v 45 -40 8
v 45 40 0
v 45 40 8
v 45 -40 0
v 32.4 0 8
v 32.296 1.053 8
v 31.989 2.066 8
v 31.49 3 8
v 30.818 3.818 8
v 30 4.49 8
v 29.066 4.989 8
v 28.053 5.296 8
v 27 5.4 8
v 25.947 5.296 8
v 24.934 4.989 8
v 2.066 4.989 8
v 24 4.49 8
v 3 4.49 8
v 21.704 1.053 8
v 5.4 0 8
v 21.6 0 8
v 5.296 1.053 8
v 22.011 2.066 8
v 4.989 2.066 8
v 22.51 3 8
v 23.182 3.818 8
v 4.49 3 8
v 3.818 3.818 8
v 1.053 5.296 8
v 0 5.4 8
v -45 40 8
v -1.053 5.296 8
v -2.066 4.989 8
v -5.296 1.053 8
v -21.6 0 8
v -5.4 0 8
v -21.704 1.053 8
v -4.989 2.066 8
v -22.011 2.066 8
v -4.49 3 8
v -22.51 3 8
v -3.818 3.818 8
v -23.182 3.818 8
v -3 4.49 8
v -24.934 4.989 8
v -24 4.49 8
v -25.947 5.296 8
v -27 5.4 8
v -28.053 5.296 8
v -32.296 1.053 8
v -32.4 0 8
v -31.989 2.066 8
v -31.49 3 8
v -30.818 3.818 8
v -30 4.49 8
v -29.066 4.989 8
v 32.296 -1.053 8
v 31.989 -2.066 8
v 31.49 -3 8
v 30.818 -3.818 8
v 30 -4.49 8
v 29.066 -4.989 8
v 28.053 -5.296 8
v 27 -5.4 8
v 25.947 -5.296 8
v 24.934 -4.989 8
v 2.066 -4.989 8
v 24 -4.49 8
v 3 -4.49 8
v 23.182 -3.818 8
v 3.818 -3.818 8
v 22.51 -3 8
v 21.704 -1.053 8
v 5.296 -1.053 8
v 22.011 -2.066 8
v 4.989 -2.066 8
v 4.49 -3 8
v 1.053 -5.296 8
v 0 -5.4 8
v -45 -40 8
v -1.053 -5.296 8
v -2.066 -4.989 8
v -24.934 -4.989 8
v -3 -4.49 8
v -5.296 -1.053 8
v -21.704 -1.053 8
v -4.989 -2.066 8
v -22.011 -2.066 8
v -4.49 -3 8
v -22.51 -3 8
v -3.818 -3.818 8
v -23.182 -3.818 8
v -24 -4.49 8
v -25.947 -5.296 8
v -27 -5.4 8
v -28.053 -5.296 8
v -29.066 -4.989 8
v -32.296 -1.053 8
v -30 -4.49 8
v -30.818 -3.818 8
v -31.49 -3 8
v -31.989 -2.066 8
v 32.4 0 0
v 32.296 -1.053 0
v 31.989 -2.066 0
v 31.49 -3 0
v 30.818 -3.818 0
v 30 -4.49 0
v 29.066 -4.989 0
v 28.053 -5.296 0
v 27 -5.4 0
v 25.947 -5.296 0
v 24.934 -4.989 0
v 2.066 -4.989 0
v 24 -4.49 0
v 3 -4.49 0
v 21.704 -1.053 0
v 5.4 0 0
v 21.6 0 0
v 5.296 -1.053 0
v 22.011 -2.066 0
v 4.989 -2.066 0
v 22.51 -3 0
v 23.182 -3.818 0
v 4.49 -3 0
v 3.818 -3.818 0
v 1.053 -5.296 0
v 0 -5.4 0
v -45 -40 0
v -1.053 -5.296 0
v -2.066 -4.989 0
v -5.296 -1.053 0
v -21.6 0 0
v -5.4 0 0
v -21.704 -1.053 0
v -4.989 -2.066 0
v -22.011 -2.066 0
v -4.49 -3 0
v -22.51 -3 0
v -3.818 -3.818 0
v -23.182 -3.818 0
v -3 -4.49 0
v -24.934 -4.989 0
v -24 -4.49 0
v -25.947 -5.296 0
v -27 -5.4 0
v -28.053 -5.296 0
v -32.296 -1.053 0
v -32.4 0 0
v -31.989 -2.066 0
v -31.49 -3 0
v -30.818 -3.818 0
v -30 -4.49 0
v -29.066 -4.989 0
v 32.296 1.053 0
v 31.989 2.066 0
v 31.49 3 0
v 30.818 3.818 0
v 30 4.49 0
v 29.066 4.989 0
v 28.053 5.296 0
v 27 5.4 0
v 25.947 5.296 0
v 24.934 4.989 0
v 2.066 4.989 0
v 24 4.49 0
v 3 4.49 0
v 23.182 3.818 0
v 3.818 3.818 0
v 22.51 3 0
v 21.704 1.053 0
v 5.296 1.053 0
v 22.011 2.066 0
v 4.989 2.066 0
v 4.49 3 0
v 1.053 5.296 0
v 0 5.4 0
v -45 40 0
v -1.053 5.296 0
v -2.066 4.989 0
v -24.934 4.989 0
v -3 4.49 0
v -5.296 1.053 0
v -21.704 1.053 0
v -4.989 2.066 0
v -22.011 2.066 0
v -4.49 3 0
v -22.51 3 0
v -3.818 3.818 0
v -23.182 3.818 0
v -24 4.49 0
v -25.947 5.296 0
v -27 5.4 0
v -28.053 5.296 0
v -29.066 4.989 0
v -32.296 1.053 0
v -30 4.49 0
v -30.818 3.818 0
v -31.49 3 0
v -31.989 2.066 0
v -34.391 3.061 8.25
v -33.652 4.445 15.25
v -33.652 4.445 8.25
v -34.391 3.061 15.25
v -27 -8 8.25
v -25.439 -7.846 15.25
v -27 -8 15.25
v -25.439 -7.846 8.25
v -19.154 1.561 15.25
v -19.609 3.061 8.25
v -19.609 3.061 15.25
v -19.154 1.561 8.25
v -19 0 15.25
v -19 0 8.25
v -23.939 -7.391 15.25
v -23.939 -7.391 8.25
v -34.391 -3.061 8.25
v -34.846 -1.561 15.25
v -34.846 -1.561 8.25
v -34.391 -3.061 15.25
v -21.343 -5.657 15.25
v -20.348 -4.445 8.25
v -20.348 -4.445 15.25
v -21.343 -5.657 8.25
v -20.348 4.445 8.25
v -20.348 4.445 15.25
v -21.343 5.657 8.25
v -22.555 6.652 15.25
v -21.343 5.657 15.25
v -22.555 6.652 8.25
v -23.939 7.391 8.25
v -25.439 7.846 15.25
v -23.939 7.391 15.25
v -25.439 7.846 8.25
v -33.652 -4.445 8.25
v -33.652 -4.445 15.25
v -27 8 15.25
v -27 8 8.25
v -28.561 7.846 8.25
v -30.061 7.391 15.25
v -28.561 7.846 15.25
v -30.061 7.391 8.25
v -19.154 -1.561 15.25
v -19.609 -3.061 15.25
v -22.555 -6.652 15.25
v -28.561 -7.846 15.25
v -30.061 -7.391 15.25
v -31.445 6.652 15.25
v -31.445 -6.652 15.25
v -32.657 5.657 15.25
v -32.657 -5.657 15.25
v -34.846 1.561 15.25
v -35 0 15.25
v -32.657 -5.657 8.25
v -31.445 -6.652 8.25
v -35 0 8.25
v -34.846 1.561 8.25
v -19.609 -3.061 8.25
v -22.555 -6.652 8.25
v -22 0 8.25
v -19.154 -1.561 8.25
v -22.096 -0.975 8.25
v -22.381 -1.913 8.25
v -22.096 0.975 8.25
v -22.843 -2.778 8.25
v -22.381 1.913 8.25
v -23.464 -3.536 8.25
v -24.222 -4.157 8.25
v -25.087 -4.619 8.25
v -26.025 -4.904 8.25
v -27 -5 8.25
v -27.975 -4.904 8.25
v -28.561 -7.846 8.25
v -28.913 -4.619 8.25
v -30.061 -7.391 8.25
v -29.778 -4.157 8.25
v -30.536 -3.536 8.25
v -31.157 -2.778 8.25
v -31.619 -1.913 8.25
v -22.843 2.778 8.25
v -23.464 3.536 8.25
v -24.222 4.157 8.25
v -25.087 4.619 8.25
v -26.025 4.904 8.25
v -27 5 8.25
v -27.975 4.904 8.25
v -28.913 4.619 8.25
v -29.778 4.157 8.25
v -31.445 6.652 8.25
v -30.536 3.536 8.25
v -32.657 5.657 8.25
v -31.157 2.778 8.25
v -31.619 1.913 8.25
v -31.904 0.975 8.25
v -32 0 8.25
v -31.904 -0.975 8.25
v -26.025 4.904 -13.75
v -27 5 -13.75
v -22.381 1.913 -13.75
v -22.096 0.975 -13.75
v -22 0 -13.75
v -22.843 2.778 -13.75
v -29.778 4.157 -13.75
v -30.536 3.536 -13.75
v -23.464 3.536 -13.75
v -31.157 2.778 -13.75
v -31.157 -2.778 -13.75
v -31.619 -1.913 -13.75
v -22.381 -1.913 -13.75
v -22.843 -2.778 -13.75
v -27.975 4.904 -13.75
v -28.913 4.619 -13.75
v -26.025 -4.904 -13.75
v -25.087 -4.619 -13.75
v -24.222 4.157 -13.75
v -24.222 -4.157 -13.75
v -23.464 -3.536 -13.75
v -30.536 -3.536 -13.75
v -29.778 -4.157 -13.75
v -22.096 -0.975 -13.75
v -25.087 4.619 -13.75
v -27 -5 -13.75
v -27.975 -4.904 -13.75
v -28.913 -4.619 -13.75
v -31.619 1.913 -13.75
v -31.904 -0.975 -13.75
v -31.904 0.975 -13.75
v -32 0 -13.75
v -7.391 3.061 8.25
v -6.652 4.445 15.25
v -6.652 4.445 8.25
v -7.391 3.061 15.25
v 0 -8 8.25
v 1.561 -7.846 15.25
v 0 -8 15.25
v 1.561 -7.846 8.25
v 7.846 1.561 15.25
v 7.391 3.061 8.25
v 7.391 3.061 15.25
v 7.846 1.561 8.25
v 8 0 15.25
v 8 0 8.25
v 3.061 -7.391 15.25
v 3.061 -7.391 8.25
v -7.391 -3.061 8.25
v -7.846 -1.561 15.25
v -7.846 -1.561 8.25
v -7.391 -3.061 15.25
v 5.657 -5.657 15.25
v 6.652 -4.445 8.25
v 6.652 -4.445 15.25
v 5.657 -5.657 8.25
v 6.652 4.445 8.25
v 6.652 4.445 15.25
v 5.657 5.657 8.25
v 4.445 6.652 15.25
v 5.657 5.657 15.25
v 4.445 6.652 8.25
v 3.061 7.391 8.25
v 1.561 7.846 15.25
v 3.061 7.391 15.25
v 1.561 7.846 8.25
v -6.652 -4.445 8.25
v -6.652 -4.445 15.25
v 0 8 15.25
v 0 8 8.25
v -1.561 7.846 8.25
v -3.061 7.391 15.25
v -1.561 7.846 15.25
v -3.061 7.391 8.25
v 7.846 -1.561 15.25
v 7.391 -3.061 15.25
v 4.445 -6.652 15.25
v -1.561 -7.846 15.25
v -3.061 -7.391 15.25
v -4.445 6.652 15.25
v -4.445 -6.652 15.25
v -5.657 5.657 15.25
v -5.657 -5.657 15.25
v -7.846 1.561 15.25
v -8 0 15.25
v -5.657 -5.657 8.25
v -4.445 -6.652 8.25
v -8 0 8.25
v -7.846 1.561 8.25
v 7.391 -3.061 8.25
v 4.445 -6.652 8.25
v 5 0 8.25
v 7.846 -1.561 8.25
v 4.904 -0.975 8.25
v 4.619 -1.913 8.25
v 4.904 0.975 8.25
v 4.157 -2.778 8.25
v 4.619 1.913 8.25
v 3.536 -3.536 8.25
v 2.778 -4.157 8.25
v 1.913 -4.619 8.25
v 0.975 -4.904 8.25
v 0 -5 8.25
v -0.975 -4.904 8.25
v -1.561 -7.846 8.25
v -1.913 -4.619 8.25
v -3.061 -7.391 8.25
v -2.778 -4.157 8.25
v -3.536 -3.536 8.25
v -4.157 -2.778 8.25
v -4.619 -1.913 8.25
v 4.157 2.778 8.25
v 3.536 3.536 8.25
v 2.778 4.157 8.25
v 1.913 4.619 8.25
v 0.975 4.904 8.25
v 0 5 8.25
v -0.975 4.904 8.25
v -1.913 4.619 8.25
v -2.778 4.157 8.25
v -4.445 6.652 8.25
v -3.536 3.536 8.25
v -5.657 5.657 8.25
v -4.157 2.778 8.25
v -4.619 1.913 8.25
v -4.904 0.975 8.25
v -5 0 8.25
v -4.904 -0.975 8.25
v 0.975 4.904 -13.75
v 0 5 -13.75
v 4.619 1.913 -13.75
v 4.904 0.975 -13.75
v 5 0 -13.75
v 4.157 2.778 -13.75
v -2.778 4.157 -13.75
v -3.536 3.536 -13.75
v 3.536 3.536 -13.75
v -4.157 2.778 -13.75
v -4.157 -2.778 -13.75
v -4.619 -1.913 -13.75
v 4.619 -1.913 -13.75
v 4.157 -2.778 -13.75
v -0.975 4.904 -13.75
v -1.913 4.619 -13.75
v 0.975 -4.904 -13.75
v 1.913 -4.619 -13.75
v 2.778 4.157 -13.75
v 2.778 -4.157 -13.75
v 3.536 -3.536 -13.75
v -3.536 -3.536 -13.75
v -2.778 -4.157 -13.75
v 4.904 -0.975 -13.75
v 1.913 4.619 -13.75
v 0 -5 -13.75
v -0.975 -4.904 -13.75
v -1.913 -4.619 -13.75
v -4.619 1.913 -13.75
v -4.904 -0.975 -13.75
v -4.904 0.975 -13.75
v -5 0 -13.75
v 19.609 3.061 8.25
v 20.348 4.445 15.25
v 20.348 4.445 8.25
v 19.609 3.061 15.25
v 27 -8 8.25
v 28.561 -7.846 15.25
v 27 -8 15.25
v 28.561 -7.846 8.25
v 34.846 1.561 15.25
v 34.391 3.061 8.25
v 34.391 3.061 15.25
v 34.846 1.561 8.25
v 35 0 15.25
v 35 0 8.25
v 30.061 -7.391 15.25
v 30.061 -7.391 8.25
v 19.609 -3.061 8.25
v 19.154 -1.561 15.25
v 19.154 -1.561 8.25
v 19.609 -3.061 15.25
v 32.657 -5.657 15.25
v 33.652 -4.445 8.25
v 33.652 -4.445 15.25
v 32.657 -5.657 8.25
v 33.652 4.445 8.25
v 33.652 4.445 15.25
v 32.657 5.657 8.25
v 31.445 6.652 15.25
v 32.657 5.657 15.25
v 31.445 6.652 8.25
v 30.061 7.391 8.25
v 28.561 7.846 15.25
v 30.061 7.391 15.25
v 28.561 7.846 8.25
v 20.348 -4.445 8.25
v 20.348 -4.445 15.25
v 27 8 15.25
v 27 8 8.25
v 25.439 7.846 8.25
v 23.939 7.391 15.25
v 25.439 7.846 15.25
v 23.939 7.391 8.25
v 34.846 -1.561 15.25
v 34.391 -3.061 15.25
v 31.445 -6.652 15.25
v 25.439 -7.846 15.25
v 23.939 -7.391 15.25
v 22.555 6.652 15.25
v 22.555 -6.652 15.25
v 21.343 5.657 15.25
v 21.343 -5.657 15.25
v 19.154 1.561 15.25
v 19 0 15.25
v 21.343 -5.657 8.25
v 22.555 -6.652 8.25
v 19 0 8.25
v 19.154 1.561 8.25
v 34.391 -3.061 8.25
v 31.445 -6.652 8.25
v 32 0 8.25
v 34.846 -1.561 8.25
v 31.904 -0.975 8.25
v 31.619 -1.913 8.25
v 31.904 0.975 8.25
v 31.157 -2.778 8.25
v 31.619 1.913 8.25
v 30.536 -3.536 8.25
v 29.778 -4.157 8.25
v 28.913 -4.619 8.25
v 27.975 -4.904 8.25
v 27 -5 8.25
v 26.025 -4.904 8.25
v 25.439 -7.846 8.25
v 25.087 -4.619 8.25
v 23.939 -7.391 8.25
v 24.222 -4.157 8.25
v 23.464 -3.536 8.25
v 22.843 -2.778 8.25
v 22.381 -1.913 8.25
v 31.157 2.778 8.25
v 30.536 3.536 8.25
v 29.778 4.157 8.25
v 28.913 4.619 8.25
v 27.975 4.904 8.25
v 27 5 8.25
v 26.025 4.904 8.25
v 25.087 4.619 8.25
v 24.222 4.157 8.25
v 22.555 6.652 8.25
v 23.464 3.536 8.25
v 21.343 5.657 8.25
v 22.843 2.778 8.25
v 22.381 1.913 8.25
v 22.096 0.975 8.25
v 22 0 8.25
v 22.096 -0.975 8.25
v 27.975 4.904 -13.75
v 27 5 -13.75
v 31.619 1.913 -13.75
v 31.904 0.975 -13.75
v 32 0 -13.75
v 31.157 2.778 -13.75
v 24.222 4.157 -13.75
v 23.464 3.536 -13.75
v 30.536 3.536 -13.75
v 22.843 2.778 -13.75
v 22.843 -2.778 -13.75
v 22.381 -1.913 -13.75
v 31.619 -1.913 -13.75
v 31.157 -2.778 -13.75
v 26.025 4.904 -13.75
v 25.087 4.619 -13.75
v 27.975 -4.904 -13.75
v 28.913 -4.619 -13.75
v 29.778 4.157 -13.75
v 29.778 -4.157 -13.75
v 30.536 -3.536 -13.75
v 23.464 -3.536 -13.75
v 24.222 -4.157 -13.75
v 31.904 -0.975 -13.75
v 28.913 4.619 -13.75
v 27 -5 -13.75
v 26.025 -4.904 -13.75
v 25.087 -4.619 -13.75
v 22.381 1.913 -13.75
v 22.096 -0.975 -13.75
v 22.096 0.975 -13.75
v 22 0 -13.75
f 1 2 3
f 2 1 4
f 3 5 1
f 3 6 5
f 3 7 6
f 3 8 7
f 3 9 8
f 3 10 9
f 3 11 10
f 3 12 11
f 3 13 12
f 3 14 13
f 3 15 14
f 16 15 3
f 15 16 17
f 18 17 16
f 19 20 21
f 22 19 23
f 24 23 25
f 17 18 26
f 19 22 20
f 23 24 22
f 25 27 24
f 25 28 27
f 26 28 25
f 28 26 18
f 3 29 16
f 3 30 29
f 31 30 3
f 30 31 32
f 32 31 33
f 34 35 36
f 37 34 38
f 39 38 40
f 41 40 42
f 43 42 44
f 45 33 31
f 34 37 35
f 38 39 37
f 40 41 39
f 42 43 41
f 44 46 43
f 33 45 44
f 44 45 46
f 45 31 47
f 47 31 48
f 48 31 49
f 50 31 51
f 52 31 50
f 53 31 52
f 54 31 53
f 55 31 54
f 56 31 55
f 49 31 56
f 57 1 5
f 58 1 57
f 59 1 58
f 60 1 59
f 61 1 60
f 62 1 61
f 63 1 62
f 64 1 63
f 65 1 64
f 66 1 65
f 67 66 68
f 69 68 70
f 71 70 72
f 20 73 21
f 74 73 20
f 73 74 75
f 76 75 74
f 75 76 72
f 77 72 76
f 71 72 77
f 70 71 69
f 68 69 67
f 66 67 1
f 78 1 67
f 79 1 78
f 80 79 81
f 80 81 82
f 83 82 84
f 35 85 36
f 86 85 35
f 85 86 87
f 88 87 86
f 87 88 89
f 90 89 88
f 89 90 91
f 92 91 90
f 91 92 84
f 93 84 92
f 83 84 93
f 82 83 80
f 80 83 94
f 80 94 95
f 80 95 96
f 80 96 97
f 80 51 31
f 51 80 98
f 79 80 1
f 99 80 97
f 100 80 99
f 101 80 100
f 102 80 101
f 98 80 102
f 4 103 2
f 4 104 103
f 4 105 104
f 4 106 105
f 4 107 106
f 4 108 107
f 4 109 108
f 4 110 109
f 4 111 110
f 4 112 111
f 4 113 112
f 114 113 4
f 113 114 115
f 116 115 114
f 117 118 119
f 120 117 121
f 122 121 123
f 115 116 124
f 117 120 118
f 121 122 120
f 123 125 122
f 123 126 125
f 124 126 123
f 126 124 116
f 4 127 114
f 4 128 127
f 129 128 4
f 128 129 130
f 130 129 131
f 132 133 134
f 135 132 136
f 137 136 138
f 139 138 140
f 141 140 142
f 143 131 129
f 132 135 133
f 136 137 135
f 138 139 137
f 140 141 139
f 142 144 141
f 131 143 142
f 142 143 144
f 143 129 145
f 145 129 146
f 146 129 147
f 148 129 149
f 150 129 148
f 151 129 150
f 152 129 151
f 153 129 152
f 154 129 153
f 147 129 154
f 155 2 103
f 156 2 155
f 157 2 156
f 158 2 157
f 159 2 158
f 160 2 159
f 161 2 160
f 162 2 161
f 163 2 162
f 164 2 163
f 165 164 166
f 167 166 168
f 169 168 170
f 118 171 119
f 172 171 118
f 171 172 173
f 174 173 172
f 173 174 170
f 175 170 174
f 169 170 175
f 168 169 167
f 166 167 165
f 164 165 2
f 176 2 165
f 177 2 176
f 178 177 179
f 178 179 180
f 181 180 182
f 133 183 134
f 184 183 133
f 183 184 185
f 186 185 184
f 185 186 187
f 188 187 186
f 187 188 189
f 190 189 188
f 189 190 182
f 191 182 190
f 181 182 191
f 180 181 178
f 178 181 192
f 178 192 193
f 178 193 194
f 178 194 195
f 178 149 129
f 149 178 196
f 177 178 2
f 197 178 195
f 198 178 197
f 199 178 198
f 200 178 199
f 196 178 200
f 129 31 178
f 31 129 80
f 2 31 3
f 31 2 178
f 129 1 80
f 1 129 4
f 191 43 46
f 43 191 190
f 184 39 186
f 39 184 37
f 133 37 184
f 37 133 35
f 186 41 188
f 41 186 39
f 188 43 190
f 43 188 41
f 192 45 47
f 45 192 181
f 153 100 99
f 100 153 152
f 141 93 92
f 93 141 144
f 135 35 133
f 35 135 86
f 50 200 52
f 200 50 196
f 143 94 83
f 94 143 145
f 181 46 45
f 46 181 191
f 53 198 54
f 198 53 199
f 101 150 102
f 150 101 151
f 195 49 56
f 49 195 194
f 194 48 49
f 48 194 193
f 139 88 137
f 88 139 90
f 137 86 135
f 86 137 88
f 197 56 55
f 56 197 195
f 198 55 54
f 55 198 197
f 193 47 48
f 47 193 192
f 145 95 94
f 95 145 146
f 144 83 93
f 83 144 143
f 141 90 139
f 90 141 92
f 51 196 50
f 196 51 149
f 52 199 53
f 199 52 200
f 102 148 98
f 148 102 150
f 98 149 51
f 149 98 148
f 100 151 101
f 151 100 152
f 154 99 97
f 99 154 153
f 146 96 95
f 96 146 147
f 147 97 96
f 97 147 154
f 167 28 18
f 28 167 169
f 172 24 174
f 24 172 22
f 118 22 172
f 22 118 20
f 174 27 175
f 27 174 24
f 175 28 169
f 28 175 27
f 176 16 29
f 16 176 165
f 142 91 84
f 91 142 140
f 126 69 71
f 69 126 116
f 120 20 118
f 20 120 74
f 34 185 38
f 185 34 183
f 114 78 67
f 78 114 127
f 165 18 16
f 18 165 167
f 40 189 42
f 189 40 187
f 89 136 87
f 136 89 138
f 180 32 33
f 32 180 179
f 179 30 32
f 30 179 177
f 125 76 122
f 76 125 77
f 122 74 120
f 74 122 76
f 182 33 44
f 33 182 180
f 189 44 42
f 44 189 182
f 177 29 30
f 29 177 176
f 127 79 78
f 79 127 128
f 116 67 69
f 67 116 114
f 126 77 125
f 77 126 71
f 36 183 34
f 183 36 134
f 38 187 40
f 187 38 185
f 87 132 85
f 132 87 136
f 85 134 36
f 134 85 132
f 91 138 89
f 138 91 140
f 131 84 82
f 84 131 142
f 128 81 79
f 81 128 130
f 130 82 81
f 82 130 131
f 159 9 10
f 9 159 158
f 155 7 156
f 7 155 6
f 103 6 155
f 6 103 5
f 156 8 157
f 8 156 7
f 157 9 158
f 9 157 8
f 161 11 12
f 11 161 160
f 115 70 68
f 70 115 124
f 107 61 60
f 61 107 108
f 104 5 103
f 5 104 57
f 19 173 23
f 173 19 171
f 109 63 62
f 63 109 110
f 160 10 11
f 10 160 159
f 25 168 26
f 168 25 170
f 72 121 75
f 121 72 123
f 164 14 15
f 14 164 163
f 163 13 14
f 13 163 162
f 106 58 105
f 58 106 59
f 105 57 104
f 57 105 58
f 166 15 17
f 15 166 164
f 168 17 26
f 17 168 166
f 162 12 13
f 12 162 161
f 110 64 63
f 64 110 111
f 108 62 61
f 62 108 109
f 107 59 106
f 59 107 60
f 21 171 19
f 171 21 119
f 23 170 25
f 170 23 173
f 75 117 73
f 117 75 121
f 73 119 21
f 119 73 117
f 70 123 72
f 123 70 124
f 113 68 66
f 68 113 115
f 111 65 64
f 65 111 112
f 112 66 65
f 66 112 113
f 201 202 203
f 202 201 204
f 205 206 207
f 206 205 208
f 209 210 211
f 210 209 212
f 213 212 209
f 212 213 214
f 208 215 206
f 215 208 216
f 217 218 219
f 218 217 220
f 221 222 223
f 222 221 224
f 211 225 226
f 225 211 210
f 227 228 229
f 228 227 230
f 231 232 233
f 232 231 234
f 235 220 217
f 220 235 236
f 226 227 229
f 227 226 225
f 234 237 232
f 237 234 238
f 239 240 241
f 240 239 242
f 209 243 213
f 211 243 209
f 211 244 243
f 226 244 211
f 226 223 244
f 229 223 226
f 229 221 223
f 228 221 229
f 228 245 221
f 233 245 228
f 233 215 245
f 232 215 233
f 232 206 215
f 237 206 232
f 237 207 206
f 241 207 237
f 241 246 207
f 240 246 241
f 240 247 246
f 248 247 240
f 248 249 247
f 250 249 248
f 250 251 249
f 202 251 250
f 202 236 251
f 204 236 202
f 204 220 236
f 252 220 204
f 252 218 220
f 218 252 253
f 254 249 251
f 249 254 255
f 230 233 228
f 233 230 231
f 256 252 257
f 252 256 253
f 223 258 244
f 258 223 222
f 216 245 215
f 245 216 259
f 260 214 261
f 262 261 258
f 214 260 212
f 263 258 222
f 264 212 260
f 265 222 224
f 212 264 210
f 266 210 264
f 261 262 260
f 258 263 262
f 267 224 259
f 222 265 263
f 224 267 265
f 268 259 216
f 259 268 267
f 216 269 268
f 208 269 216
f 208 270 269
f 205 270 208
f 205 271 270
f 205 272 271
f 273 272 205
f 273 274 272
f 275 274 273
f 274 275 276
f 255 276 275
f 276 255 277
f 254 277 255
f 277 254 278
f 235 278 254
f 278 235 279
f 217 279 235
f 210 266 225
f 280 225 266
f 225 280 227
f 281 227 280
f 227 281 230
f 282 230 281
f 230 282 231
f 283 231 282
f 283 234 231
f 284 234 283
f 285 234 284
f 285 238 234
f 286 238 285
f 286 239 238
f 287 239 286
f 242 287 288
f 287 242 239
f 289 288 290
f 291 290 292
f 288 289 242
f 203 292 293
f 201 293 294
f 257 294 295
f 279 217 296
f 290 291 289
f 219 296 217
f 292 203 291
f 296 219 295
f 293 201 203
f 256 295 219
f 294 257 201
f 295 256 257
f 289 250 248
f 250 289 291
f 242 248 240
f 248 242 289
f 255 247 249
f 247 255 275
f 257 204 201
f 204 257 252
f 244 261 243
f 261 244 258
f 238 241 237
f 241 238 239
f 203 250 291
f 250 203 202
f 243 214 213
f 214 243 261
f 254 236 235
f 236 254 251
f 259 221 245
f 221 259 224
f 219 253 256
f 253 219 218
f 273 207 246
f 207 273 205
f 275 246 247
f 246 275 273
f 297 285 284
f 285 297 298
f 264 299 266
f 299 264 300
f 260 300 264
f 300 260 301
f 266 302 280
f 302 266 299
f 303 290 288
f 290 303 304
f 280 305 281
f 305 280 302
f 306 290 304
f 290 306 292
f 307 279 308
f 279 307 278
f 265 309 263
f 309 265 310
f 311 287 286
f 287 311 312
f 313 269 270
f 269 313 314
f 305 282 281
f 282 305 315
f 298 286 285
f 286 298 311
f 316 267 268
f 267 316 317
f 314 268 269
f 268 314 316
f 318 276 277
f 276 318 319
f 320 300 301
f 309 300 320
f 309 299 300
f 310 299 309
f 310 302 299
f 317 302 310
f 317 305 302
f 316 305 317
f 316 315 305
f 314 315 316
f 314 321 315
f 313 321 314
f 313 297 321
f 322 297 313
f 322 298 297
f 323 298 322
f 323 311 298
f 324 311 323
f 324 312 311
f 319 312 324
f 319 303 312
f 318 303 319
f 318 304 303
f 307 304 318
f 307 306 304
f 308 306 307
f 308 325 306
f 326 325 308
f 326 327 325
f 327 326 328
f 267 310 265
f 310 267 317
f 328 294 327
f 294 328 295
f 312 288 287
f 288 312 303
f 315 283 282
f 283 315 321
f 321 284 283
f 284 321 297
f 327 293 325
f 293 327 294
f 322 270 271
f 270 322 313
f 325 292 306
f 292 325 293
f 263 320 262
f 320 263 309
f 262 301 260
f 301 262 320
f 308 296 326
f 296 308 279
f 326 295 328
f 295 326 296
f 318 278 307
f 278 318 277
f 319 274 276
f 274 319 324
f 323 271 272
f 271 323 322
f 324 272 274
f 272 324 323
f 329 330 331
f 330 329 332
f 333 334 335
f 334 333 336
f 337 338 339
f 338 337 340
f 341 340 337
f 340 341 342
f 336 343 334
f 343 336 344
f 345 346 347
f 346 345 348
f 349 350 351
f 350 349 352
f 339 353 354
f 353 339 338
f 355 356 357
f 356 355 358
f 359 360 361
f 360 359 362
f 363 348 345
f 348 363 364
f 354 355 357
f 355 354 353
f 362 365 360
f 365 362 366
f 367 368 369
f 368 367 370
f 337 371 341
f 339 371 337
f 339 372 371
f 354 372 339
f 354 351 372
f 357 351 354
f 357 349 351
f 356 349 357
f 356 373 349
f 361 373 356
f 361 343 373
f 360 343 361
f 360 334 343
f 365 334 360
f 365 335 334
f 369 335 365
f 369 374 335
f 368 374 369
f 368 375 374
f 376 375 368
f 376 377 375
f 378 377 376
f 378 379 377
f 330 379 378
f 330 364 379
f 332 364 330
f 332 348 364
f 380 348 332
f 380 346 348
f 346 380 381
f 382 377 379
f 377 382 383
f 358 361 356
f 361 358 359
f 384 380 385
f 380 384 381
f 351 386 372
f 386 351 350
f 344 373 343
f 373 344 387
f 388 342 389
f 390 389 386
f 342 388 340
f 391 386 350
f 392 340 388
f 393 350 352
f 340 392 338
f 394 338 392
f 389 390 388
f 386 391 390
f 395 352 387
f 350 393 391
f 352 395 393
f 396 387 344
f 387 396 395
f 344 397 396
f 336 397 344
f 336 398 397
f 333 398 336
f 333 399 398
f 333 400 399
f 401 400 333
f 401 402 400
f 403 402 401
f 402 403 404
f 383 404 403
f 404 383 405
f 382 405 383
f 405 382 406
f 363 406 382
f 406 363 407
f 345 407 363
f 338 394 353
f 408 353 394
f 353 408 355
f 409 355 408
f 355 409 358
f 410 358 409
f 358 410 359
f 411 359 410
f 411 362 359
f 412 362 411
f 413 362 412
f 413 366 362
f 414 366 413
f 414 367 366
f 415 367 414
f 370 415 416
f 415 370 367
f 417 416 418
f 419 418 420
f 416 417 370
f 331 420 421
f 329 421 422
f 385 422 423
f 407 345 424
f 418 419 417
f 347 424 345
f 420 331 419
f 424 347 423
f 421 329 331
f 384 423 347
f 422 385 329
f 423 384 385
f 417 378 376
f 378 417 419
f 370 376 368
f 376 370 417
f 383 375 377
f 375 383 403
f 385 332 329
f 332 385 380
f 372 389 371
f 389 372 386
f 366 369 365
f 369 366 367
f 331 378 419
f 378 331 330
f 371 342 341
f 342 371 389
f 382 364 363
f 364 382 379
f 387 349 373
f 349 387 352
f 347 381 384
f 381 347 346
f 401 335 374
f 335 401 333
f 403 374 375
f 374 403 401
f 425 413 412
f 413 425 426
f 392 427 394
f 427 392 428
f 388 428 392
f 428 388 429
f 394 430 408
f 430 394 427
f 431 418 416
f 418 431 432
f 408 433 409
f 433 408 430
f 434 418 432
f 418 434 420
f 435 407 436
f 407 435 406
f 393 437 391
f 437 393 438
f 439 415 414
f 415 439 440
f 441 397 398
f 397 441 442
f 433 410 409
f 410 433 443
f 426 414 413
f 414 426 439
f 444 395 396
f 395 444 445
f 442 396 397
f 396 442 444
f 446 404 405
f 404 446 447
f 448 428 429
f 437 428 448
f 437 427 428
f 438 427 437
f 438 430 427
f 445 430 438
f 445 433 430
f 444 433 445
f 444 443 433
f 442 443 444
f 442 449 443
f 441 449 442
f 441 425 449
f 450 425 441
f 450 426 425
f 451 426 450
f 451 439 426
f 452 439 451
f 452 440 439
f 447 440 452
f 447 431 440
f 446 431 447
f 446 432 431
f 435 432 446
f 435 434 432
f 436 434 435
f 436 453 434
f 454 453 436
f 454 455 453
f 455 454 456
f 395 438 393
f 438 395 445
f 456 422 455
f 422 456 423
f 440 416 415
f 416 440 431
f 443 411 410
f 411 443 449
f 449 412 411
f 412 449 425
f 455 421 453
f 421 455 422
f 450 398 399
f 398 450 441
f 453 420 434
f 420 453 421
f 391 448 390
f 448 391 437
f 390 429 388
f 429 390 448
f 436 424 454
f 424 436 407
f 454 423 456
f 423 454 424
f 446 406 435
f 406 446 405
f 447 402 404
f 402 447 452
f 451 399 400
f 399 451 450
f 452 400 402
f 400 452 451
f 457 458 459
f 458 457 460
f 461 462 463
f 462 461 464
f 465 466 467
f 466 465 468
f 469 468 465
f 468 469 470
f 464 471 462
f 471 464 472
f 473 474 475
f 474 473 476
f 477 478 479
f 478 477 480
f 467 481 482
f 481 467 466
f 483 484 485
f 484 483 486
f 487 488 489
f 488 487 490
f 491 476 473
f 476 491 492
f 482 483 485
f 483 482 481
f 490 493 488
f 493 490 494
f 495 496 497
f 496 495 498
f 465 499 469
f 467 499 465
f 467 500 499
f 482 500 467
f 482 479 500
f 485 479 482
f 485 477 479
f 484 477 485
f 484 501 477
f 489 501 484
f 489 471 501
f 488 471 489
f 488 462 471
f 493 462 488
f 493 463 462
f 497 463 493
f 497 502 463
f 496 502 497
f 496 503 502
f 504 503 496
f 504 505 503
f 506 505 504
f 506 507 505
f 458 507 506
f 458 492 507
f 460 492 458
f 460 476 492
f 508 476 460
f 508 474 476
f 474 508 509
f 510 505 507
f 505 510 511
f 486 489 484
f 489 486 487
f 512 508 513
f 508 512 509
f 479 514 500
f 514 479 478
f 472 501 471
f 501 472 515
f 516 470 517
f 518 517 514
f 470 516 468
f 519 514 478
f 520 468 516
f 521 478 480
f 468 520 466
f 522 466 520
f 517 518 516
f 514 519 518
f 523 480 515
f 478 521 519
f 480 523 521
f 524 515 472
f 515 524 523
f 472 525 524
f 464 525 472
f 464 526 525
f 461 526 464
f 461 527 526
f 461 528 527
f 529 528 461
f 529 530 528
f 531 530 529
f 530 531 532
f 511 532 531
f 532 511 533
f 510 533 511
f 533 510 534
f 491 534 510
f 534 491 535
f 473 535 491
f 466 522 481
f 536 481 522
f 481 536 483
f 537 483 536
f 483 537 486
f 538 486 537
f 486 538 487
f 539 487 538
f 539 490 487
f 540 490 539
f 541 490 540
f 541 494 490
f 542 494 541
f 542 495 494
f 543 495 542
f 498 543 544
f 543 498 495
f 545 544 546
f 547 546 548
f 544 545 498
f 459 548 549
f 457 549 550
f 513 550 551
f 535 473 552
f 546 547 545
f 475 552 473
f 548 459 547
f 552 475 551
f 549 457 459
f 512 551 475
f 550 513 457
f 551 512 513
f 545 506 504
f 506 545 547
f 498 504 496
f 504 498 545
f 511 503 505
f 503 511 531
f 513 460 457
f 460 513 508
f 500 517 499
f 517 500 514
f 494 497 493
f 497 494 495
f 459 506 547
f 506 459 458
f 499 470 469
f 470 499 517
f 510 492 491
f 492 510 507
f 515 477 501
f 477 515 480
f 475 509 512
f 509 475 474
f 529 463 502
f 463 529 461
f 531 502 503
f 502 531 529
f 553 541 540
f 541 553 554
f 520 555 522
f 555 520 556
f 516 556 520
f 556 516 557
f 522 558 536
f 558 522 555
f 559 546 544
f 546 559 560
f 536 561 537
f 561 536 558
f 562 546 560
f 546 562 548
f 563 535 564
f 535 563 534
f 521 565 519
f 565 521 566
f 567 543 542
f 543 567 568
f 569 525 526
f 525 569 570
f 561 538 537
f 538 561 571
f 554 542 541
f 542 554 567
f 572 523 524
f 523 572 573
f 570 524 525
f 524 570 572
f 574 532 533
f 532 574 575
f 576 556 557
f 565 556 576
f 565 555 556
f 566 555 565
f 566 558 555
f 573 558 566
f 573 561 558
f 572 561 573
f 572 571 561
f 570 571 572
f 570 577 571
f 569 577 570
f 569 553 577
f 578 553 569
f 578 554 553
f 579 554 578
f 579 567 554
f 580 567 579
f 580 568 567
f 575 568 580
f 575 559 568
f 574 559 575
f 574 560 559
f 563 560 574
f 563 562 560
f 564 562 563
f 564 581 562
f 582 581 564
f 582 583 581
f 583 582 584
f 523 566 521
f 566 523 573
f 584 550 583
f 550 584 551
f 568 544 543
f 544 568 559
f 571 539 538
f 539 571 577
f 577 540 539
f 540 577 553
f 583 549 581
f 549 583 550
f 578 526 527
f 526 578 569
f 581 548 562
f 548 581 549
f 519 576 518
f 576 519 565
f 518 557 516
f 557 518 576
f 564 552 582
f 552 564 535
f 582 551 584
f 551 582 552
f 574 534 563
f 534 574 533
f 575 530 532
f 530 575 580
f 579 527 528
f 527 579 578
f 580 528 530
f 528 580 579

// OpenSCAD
$fn = 32;

// ------------------------------------------------------------------------
// Bolted plate: 90 x 80 x 8 mm plate, 3 fasteners
// Every part is its own module, assembly() places them once.
// ------------------------------------------------------------------------

// --- part 1 ---
module plate() {
  difference() {
    translate([-45, -40, 0]) cube([90, 80, 8]);
    translate([-27, 0, -1]) cylinder(h = 10, d = 10.8);
    translate([0, 0, -1]) cylinder(h = 10, d = 10.8);
    translate([27, 0, -1]) cylinder(h = 10, d = 10.8);
  }
}

// --- part 2 ---
module bolt1() {
  cylinder(h = 7, d = 16);
  translate([0, 0, -22]) cylinder(h = 22, d = 10);
}

// --- part 3 ---
module bolt2() {
  cylinder(h = 7, d = 16);
  translate([0, 0, -22]) cylinder(h = 22, d = 10);
}

// --- part 4 ---
module bolt3() {
  cylinder(h = 7, d = 16);
  translate([0, 0, -22]) cylinder(h = 22, d = 10);
}

// --- assembly ---
module assembly() {
  translate([0, 0, 0]) rotate([0, 0, 0]) plate();
  translate([-27, 0, 8.25]) rotate([0, 0, 0]) bolt1();
  translate([0, 0, 8.25]) rotate([0, 0, 0]) bolt2();
  translate([27, 0, 8.25]) rotate([0, 0, 0]) bolt3();
}

assembly();
